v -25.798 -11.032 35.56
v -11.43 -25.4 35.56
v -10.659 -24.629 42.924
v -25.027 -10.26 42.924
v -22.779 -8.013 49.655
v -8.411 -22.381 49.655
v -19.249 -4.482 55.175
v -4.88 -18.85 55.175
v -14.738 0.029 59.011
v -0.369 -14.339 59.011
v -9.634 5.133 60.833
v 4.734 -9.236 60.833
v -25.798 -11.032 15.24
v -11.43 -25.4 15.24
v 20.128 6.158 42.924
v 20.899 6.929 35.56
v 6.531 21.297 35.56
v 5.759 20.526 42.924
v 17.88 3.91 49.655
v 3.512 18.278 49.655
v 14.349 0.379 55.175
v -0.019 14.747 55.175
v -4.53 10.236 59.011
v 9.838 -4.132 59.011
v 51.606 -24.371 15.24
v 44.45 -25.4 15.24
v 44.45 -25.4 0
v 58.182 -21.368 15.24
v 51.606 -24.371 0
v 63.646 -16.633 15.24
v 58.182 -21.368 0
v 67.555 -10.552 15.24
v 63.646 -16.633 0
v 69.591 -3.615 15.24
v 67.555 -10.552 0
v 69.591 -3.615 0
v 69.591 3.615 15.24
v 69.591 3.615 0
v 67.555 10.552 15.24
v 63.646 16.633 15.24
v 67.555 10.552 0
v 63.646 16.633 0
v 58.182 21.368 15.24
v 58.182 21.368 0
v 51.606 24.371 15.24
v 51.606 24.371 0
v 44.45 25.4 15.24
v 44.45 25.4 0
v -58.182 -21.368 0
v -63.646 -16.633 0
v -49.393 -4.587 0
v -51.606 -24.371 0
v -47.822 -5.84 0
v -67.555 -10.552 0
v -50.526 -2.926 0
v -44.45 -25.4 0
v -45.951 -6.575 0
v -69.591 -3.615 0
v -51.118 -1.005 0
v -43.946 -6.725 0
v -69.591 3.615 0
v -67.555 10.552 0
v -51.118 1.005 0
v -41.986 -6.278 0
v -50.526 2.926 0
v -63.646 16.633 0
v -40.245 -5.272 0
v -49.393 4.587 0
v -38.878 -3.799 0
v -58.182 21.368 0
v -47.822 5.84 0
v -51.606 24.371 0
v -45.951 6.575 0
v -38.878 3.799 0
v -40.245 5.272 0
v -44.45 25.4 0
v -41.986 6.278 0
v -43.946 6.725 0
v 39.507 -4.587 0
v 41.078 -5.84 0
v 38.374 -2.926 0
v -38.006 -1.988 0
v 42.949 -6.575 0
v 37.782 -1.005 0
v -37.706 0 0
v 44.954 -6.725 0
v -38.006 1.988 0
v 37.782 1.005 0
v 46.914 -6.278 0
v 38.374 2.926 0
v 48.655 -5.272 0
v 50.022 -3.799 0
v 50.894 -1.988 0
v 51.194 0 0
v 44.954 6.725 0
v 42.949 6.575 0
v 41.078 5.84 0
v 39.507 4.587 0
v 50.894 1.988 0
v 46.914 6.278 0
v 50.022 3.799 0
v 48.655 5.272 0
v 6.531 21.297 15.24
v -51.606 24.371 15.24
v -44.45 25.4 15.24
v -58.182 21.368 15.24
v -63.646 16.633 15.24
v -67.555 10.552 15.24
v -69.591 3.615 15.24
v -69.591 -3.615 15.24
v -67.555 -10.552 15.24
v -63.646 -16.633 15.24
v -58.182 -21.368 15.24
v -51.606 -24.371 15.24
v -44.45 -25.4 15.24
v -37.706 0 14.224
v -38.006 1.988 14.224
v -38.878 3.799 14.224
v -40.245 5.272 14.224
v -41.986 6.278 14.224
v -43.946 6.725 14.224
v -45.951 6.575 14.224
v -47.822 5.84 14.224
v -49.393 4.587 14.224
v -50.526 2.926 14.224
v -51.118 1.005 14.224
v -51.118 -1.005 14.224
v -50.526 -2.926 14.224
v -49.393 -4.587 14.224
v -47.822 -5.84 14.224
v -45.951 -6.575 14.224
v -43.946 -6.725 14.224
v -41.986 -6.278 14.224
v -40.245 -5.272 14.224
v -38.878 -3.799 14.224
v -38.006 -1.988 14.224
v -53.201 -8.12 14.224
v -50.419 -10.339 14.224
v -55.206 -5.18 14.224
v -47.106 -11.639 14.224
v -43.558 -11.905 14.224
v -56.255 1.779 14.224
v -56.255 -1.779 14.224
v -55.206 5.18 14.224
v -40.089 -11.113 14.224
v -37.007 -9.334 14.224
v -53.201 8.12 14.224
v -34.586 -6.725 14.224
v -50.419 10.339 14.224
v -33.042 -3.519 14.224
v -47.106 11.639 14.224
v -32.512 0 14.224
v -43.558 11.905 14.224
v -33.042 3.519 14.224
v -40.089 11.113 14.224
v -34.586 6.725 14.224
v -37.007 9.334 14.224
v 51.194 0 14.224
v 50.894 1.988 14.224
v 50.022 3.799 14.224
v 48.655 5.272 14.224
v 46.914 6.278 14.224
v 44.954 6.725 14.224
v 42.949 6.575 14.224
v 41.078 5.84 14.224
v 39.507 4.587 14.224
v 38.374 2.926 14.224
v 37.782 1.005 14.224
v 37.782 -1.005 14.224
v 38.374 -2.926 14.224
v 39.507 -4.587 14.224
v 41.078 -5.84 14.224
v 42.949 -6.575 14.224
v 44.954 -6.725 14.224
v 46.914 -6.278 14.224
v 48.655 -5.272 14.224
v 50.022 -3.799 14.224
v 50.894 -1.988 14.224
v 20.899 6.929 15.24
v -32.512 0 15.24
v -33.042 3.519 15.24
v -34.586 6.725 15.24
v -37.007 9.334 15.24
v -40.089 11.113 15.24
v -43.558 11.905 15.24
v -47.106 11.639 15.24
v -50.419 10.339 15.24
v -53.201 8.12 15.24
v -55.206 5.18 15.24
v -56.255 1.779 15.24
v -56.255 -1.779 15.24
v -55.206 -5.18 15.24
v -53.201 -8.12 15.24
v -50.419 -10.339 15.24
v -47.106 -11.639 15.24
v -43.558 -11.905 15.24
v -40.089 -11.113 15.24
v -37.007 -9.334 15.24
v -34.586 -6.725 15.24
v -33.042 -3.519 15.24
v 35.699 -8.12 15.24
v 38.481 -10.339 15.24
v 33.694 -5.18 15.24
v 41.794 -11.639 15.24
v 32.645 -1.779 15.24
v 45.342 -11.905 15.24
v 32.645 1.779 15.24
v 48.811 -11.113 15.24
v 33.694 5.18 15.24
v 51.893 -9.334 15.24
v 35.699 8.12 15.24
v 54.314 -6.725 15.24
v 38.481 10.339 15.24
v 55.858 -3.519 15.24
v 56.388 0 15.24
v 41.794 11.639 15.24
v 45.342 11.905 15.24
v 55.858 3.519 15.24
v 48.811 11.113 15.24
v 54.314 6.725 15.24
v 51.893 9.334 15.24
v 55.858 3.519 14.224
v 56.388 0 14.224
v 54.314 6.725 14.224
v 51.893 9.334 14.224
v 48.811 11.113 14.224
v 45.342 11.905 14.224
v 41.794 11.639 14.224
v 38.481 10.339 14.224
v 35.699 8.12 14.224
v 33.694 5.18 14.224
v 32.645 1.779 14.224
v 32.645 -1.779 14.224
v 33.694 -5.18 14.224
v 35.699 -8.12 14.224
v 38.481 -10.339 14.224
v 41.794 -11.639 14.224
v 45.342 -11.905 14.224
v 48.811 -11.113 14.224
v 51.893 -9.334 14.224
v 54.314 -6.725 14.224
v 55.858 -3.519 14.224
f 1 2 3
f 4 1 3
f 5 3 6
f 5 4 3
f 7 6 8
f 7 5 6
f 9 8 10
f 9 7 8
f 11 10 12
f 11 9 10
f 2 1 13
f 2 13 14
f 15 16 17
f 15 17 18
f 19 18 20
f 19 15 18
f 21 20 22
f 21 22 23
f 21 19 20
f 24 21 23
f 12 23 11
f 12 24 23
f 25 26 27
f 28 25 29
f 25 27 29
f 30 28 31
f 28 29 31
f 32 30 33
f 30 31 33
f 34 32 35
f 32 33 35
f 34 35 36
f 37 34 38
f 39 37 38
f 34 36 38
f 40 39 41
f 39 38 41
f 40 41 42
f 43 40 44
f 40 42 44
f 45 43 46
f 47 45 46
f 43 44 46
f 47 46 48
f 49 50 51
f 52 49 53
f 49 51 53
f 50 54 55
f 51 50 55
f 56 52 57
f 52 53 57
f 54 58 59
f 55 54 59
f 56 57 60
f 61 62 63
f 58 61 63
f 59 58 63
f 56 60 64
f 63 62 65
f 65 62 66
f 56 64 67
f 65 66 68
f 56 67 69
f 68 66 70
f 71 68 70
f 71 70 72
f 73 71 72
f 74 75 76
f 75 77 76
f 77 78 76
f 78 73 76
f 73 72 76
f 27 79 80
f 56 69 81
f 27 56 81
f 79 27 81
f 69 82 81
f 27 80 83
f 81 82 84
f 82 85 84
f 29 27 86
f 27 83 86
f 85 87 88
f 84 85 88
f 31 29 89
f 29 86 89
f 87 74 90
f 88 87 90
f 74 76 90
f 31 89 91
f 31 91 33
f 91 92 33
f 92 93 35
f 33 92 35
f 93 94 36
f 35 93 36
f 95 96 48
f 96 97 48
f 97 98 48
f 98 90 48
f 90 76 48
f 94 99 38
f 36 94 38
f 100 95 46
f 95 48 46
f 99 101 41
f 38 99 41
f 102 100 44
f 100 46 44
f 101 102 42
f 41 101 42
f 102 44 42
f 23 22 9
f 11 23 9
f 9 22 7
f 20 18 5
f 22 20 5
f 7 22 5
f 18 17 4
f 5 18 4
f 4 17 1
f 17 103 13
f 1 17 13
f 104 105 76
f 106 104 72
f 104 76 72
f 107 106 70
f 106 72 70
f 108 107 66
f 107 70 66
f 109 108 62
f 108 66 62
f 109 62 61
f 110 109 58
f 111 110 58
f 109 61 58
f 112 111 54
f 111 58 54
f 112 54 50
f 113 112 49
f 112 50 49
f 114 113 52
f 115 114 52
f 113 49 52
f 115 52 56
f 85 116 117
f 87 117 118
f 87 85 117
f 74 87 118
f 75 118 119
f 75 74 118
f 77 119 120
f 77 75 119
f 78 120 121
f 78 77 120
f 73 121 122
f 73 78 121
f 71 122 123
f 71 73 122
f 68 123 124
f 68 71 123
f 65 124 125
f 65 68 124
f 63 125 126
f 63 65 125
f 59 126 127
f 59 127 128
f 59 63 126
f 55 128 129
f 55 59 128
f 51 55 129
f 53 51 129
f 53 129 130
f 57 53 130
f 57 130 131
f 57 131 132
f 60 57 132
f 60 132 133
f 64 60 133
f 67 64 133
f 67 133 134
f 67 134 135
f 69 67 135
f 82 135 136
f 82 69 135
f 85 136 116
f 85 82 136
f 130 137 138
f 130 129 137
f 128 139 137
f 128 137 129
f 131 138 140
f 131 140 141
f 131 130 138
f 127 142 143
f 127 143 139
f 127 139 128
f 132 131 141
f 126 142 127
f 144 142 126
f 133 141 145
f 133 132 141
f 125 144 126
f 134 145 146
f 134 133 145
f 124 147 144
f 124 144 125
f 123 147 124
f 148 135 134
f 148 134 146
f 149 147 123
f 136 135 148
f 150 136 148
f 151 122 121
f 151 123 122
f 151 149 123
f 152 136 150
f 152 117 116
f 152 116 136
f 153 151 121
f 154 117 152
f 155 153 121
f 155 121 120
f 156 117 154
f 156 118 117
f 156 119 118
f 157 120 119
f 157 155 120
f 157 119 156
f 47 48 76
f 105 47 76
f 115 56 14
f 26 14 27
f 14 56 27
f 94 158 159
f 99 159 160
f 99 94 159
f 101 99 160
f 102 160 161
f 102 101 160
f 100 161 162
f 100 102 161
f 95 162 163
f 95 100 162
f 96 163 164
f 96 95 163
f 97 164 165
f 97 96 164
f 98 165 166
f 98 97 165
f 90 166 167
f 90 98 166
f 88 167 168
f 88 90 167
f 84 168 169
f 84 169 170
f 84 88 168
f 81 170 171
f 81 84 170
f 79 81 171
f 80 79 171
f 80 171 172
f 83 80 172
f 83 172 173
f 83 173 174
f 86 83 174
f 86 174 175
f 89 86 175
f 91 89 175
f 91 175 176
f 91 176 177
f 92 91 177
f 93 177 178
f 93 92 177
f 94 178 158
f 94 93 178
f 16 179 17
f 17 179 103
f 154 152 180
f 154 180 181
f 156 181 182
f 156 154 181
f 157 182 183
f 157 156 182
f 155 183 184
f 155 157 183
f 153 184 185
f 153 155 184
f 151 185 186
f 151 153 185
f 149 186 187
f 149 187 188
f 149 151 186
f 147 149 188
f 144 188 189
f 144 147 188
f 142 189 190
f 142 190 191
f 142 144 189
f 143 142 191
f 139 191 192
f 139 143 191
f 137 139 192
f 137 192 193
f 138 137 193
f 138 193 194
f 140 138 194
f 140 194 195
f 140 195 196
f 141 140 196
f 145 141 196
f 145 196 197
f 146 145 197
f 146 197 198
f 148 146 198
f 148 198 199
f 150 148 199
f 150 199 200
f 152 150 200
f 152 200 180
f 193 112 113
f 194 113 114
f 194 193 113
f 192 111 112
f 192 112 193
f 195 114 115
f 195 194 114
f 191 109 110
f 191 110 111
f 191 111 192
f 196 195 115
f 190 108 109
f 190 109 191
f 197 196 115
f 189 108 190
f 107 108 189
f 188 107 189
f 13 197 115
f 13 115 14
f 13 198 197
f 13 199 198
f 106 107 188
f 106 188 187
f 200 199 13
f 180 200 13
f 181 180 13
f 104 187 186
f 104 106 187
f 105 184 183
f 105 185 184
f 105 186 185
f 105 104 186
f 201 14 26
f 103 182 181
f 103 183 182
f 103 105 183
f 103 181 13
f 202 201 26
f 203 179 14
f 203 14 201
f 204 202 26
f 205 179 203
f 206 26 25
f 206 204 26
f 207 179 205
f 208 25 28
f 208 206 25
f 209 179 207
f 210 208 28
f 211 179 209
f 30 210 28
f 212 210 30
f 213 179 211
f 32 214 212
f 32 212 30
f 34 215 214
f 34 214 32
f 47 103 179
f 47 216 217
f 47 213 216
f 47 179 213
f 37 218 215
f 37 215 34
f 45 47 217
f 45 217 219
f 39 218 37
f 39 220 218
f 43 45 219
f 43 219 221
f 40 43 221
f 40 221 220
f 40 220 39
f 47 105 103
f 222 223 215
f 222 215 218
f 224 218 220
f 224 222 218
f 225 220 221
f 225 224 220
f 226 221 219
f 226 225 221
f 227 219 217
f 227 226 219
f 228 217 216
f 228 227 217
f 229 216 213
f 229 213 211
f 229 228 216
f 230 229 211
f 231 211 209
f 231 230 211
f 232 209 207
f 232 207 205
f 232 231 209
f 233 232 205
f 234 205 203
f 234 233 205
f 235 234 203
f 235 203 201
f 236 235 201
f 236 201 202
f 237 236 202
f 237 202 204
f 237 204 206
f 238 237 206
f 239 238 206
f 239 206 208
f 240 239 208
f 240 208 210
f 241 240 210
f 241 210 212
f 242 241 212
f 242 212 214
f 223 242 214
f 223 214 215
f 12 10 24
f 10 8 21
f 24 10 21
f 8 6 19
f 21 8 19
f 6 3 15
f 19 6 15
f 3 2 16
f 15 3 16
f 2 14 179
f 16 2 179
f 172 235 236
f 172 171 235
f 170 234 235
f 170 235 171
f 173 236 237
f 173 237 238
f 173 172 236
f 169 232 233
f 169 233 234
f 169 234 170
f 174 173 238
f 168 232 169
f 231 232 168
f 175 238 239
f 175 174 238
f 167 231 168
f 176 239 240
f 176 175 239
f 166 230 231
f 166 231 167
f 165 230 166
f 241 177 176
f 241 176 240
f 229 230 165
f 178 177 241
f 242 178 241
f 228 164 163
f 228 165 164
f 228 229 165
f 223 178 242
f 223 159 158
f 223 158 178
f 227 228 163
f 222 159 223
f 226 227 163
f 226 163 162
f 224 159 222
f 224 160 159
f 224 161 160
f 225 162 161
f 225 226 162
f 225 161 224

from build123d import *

# Parameters (mm, degrees)
F0_R        = 11.938
F1_DEPTH    = 15.24
F0_R_2      = 6.7437
F2_DEPTH    = 14.224
F5_DEPTH    = 45.72
F6_T1_DEPTH = 147.32
F6_T3_DEPTH = 147.32


# Not quite as in the source:
# - a fillet or chamfer that OpenCascade refuses, or shapes differently, is made with other operations: its cross-section is extruded or revolved along the edge and cut away or added


with BuildPart() as f1:
    # F0 (on Top) → F1 (new body)
    with BuildSketch(Plane.XY):
        with BuildLine():
            ThreePointArc((44.45, -25.4), (69.85, 0), (44.45, 25.4))
            Line((44.45, 25.4), (-44.45, 25.4))
            ThreePointArc((-44.45, 25.4), (-69.85, 0), (-44.45, -25.4))
            Line((-44.45, -25.4), (44.45, -25.4))
        make_face()
        with Locations((-44.45, 0)):
            Circle(F0_R, mode=Mode.SUBTRACT)
        with Locations((44.45, 0)):
            Circle(F0_R, mode=Mode.SUBTRACT)
    extrude(amount=F1_DEPTH)

    # F0 (on Top) → F2 (join)
    with BuildSketch(Plane.XY):
        with Locations((-44.45, 0)):
            Circle(F0_R)
        with Locations((-44.45, 0)):
            Circle(F0_R_2, mode=Mode.SUBTRACT)
        with Locations((44.45, 0)):
            Circle(F0_R)
        with Locations((44.45, 0)):
            Circle(F0_R_2, mode=Mode.SUBTRACT)
    extrude(amount=F2_DEPTH)

    # F4 (on face) → F5 (join)
    with BuildSketch(Plane.XY.offset(15.24)):
        Polygon((-25.7984097937, -11.0315902063), (-11.43, -25.4), (20.8989220358, 6.9289220358), (6.5305122421, 21.2973318296), align=None)
    extrude(amount=F5_DEPTH)

    # F6: fillet of radius 25.4 on 2 edges, made by hand

    # F6_s2 → F6_t1 (cut)
    with BuildSketch(Plane(origin=(-52.2846903991, 52.2846903991, 0), x_dir=(0, 0, 1), z_dir=(0.7071067812, -0.7071067812, 0))):
        with BuildLine():
            ThreePointArc((35.56, 26.0427427511), (53.5205122421, 18.6032549932), (60.96, 0.6427427511))
            Line((60.96, 0.6427427511), (60.96, 26.0427427511))
            Line((60.96, 26.0427427511), (35.56, 26.0427427511))
        make_face()
    extrude(amount=F6_T1_DEPTH, mode=Mode.SUBTRACT)

    # F6_s4 → F6_t3 (cut)
    with BuildSketch(Plane(origin=(51.8862806053, -51.8862806053, 0), x_dir=(0, 0, 1), z_dir=(-0.7071067812, 0.7071067812, 0))):
        with BuildLine():
            ThreePointArc((35.56, 19.6772572489), (53.5205122421, 12.237769491), (60.96, -5.7227427511))
            Line((60.96, -5.7227427511), (60.96, 19.6772572489))
            Line((60.96, 19.6772572489), (35.56, 19.6772572489))
        make_face()
    extrude(amount=F6_T3_DEPTH, mode=Mode.SUBTRACT)


solid = f1.part
